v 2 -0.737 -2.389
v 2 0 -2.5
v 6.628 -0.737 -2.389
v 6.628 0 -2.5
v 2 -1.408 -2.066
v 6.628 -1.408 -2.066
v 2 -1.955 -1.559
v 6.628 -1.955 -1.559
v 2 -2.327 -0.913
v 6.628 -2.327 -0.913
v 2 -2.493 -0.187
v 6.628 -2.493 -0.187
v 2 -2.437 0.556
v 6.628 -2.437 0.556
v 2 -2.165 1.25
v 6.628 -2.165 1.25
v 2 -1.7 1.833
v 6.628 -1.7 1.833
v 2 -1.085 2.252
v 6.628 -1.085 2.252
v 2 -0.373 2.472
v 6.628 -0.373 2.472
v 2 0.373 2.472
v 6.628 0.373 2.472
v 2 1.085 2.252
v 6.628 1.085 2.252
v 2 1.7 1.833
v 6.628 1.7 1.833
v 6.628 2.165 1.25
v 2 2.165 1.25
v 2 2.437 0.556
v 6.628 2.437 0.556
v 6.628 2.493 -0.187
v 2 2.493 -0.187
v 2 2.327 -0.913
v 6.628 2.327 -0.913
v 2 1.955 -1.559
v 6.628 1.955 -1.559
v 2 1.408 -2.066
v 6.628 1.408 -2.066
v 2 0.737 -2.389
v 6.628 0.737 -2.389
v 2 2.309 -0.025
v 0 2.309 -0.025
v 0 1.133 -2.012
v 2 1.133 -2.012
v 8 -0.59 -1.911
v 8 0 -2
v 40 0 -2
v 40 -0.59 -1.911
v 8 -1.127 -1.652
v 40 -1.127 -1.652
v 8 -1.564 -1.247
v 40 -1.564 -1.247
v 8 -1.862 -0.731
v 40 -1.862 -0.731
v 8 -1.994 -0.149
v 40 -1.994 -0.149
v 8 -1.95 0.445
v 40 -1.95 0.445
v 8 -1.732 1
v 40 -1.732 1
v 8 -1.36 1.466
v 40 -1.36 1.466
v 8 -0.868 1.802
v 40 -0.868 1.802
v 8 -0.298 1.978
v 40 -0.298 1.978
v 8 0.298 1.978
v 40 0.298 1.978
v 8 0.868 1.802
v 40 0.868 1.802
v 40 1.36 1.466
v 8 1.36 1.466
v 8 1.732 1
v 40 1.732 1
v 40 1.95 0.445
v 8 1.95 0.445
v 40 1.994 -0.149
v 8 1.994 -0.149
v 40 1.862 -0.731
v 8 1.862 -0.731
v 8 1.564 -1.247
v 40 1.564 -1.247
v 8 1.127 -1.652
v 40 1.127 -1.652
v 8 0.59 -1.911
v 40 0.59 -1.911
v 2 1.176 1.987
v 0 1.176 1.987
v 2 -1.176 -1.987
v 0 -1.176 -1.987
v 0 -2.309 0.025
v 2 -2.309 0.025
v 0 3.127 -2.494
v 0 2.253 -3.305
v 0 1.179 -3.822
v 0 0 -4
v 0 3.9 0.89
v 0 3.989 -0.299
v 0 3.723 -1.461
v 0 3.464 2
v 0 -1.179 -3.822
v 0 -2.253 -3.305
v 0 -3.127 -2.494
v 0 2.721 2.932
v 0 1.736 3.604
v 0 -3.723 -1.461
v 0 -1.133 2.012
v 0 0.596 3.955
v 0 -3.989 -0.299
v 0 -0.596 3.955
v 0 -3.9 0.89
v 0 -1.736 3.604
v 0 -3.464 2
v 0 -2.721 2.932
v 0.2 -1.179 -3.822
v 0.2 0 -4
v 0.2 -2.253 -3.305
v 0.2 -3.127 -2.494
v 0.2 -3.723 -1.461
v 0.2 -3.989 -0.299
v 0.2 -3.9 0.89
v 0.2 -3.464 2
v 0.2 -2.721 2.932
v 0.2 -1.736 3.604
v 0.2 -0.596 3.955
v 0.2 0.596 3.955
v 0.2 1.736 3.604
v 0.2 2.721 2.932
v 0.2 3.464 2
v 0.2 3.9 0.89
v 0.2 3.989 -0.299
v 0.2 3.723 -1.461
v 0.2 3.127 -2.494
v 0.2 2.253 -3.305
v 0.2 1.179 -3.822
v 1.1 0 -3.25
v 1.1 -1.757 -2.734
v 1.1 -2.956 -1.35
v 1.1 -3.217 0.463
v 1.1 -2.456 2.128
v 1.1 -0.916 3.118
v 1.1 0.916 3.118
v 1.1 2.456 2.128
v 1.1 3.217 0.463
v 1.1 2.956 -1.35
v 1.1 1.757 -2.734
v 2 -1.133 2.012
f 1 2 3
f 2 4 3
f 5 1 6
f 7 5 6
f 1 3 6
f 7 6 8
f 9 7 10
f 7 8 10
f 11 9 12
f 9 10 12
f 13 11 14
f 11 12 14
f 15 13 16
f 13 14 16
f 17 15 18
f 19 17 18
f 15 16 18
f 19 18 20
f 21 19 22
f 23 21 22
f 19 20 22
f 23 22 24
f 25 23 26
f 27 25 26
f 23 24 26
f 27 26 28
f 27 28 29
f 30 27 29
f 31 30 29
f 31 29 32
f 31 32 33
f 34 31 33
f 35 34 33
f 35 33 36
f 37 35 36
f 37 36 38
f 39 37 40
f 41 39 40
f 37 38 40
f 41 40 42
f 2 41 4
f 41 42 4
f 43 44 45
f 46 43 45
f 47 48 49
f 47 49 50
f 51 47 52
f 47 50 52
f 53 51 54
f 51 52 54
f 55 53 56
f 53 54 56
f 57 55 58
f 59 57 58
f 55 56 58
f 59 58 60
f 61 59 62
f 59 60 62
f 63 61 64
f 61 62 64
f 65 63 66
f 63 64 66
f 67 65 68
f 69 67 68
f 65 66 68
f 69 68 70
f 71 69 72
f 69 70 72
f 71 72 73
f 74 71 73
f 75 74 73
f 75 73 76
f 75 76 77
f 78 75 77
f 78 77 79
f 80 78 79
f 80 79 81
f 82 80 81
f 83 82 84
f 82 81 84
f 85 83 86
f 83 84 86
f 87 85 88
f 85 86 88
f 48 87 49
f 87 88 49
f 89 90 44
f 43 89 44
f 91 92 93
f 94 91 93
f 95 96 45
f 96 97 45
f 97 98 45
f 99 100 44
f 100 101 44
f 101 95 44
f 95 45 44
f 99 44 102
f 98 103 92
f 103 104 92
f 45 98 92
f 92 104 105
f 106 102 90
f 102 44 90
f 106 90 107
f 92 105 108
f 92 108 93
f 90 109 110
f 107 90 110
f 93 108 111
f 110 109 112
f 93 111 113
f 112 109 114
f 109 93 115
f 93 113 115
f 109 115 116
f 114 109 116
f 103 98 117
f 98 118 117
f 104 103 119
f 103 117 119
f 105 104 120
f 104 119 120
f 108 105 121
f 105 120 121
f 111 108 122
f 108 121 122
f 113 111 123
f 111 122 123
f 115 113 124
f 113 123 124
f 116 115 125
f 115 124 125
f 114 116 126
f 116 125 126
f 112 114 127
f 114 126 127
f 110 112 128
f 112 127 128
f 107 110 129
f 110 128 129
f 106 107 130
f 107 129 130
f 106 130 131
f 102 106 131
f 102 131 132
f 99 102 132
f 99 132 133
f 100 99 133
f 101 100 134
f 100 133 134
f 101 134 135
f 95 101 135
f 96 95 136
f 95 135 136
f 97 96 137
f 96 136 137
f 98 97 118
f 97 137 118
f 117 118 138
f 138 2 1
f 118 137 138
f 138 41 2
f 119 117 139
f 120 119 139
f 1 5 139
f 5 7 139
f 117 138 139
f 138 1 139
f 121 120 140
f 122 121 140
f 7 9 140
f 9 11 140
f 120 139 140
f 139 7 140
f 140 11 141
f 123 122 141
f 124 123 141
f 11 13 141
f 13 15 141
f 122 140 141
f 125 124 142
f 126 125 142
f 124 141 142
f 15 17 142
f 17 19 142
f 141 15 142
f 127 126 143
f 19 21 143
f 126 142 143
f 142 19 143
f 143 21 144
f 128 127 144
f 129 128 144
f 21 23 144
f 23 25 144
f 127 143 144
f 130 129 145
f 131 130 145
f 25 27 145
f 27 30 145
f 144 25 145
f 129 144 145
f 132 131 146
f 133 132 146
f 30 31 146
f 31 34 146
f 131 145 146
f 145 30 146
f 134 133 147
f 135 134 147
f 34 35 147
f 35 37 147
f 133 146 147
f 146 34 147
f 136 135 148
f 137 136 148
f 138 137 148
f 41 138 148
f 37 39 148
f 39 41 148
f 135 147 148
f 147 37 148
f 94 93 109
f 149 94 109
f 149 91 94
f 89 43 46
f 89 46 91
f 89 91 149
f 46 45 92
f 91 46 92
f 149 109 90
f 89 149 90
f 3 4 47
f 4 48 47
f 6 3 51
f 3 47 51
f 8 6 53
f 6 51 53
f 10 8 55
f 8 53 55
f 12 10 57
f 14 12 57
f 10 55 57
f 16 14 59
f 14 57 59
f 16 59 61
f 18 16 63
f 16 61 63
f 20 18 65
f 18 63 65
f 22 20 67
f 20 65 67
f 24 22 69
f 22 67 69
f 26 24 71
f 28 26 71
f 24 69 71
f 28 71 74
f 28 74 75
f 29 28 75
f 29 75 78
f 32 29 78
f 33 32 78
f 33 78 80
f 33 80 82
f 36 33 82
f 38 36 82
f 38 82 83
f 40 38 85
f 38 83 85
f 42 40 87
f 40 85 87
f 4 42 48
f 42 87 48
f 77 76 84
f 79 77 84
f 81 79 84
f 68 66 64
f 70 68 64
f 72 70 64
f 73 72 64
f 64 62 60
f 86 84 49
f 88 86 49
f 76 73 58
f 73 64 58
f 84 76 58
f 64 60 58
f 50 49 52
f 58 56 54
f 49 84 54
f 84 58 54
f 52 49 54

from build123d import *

# Parameters (mm, degrees)
CUT_EXTRUDE1_DEPTH = 2


with BuildPart() as part:
    # Sketch1 → Revolve1 (revolve)
    with BuildSketch(Plane(origin=(0, 0, 0), x_dir=(1, 0, 0), z_dir=(0, 1, 0))):
        Polygon((0, 0), (0, 4), (0.2, 4), (2, 2.5), (6.627677822, 2.5), (8, 2), (40, 2), (40, 0), align=None)
    revolve(axis=Axis((40, 0, 0), (-1, 0, 0)))

    # Sketch2 → Cut-Extrude1 (cut)
    with BuildSketch(Plane.ZY):
        Polygon((1.987284991, 1.176448765), (-0.025192021, 2.30926367), (-2.012477012, 1.132814905), (-1.987284991, -1.176448765), (0.025192021, -2.30926367), (2.012477012, -1.132814905), align=None)
    extrude(amount=-CUT_EXTRUDE1_DEPTH, mode=Mode.SUBTRACT)


solid = part.part
